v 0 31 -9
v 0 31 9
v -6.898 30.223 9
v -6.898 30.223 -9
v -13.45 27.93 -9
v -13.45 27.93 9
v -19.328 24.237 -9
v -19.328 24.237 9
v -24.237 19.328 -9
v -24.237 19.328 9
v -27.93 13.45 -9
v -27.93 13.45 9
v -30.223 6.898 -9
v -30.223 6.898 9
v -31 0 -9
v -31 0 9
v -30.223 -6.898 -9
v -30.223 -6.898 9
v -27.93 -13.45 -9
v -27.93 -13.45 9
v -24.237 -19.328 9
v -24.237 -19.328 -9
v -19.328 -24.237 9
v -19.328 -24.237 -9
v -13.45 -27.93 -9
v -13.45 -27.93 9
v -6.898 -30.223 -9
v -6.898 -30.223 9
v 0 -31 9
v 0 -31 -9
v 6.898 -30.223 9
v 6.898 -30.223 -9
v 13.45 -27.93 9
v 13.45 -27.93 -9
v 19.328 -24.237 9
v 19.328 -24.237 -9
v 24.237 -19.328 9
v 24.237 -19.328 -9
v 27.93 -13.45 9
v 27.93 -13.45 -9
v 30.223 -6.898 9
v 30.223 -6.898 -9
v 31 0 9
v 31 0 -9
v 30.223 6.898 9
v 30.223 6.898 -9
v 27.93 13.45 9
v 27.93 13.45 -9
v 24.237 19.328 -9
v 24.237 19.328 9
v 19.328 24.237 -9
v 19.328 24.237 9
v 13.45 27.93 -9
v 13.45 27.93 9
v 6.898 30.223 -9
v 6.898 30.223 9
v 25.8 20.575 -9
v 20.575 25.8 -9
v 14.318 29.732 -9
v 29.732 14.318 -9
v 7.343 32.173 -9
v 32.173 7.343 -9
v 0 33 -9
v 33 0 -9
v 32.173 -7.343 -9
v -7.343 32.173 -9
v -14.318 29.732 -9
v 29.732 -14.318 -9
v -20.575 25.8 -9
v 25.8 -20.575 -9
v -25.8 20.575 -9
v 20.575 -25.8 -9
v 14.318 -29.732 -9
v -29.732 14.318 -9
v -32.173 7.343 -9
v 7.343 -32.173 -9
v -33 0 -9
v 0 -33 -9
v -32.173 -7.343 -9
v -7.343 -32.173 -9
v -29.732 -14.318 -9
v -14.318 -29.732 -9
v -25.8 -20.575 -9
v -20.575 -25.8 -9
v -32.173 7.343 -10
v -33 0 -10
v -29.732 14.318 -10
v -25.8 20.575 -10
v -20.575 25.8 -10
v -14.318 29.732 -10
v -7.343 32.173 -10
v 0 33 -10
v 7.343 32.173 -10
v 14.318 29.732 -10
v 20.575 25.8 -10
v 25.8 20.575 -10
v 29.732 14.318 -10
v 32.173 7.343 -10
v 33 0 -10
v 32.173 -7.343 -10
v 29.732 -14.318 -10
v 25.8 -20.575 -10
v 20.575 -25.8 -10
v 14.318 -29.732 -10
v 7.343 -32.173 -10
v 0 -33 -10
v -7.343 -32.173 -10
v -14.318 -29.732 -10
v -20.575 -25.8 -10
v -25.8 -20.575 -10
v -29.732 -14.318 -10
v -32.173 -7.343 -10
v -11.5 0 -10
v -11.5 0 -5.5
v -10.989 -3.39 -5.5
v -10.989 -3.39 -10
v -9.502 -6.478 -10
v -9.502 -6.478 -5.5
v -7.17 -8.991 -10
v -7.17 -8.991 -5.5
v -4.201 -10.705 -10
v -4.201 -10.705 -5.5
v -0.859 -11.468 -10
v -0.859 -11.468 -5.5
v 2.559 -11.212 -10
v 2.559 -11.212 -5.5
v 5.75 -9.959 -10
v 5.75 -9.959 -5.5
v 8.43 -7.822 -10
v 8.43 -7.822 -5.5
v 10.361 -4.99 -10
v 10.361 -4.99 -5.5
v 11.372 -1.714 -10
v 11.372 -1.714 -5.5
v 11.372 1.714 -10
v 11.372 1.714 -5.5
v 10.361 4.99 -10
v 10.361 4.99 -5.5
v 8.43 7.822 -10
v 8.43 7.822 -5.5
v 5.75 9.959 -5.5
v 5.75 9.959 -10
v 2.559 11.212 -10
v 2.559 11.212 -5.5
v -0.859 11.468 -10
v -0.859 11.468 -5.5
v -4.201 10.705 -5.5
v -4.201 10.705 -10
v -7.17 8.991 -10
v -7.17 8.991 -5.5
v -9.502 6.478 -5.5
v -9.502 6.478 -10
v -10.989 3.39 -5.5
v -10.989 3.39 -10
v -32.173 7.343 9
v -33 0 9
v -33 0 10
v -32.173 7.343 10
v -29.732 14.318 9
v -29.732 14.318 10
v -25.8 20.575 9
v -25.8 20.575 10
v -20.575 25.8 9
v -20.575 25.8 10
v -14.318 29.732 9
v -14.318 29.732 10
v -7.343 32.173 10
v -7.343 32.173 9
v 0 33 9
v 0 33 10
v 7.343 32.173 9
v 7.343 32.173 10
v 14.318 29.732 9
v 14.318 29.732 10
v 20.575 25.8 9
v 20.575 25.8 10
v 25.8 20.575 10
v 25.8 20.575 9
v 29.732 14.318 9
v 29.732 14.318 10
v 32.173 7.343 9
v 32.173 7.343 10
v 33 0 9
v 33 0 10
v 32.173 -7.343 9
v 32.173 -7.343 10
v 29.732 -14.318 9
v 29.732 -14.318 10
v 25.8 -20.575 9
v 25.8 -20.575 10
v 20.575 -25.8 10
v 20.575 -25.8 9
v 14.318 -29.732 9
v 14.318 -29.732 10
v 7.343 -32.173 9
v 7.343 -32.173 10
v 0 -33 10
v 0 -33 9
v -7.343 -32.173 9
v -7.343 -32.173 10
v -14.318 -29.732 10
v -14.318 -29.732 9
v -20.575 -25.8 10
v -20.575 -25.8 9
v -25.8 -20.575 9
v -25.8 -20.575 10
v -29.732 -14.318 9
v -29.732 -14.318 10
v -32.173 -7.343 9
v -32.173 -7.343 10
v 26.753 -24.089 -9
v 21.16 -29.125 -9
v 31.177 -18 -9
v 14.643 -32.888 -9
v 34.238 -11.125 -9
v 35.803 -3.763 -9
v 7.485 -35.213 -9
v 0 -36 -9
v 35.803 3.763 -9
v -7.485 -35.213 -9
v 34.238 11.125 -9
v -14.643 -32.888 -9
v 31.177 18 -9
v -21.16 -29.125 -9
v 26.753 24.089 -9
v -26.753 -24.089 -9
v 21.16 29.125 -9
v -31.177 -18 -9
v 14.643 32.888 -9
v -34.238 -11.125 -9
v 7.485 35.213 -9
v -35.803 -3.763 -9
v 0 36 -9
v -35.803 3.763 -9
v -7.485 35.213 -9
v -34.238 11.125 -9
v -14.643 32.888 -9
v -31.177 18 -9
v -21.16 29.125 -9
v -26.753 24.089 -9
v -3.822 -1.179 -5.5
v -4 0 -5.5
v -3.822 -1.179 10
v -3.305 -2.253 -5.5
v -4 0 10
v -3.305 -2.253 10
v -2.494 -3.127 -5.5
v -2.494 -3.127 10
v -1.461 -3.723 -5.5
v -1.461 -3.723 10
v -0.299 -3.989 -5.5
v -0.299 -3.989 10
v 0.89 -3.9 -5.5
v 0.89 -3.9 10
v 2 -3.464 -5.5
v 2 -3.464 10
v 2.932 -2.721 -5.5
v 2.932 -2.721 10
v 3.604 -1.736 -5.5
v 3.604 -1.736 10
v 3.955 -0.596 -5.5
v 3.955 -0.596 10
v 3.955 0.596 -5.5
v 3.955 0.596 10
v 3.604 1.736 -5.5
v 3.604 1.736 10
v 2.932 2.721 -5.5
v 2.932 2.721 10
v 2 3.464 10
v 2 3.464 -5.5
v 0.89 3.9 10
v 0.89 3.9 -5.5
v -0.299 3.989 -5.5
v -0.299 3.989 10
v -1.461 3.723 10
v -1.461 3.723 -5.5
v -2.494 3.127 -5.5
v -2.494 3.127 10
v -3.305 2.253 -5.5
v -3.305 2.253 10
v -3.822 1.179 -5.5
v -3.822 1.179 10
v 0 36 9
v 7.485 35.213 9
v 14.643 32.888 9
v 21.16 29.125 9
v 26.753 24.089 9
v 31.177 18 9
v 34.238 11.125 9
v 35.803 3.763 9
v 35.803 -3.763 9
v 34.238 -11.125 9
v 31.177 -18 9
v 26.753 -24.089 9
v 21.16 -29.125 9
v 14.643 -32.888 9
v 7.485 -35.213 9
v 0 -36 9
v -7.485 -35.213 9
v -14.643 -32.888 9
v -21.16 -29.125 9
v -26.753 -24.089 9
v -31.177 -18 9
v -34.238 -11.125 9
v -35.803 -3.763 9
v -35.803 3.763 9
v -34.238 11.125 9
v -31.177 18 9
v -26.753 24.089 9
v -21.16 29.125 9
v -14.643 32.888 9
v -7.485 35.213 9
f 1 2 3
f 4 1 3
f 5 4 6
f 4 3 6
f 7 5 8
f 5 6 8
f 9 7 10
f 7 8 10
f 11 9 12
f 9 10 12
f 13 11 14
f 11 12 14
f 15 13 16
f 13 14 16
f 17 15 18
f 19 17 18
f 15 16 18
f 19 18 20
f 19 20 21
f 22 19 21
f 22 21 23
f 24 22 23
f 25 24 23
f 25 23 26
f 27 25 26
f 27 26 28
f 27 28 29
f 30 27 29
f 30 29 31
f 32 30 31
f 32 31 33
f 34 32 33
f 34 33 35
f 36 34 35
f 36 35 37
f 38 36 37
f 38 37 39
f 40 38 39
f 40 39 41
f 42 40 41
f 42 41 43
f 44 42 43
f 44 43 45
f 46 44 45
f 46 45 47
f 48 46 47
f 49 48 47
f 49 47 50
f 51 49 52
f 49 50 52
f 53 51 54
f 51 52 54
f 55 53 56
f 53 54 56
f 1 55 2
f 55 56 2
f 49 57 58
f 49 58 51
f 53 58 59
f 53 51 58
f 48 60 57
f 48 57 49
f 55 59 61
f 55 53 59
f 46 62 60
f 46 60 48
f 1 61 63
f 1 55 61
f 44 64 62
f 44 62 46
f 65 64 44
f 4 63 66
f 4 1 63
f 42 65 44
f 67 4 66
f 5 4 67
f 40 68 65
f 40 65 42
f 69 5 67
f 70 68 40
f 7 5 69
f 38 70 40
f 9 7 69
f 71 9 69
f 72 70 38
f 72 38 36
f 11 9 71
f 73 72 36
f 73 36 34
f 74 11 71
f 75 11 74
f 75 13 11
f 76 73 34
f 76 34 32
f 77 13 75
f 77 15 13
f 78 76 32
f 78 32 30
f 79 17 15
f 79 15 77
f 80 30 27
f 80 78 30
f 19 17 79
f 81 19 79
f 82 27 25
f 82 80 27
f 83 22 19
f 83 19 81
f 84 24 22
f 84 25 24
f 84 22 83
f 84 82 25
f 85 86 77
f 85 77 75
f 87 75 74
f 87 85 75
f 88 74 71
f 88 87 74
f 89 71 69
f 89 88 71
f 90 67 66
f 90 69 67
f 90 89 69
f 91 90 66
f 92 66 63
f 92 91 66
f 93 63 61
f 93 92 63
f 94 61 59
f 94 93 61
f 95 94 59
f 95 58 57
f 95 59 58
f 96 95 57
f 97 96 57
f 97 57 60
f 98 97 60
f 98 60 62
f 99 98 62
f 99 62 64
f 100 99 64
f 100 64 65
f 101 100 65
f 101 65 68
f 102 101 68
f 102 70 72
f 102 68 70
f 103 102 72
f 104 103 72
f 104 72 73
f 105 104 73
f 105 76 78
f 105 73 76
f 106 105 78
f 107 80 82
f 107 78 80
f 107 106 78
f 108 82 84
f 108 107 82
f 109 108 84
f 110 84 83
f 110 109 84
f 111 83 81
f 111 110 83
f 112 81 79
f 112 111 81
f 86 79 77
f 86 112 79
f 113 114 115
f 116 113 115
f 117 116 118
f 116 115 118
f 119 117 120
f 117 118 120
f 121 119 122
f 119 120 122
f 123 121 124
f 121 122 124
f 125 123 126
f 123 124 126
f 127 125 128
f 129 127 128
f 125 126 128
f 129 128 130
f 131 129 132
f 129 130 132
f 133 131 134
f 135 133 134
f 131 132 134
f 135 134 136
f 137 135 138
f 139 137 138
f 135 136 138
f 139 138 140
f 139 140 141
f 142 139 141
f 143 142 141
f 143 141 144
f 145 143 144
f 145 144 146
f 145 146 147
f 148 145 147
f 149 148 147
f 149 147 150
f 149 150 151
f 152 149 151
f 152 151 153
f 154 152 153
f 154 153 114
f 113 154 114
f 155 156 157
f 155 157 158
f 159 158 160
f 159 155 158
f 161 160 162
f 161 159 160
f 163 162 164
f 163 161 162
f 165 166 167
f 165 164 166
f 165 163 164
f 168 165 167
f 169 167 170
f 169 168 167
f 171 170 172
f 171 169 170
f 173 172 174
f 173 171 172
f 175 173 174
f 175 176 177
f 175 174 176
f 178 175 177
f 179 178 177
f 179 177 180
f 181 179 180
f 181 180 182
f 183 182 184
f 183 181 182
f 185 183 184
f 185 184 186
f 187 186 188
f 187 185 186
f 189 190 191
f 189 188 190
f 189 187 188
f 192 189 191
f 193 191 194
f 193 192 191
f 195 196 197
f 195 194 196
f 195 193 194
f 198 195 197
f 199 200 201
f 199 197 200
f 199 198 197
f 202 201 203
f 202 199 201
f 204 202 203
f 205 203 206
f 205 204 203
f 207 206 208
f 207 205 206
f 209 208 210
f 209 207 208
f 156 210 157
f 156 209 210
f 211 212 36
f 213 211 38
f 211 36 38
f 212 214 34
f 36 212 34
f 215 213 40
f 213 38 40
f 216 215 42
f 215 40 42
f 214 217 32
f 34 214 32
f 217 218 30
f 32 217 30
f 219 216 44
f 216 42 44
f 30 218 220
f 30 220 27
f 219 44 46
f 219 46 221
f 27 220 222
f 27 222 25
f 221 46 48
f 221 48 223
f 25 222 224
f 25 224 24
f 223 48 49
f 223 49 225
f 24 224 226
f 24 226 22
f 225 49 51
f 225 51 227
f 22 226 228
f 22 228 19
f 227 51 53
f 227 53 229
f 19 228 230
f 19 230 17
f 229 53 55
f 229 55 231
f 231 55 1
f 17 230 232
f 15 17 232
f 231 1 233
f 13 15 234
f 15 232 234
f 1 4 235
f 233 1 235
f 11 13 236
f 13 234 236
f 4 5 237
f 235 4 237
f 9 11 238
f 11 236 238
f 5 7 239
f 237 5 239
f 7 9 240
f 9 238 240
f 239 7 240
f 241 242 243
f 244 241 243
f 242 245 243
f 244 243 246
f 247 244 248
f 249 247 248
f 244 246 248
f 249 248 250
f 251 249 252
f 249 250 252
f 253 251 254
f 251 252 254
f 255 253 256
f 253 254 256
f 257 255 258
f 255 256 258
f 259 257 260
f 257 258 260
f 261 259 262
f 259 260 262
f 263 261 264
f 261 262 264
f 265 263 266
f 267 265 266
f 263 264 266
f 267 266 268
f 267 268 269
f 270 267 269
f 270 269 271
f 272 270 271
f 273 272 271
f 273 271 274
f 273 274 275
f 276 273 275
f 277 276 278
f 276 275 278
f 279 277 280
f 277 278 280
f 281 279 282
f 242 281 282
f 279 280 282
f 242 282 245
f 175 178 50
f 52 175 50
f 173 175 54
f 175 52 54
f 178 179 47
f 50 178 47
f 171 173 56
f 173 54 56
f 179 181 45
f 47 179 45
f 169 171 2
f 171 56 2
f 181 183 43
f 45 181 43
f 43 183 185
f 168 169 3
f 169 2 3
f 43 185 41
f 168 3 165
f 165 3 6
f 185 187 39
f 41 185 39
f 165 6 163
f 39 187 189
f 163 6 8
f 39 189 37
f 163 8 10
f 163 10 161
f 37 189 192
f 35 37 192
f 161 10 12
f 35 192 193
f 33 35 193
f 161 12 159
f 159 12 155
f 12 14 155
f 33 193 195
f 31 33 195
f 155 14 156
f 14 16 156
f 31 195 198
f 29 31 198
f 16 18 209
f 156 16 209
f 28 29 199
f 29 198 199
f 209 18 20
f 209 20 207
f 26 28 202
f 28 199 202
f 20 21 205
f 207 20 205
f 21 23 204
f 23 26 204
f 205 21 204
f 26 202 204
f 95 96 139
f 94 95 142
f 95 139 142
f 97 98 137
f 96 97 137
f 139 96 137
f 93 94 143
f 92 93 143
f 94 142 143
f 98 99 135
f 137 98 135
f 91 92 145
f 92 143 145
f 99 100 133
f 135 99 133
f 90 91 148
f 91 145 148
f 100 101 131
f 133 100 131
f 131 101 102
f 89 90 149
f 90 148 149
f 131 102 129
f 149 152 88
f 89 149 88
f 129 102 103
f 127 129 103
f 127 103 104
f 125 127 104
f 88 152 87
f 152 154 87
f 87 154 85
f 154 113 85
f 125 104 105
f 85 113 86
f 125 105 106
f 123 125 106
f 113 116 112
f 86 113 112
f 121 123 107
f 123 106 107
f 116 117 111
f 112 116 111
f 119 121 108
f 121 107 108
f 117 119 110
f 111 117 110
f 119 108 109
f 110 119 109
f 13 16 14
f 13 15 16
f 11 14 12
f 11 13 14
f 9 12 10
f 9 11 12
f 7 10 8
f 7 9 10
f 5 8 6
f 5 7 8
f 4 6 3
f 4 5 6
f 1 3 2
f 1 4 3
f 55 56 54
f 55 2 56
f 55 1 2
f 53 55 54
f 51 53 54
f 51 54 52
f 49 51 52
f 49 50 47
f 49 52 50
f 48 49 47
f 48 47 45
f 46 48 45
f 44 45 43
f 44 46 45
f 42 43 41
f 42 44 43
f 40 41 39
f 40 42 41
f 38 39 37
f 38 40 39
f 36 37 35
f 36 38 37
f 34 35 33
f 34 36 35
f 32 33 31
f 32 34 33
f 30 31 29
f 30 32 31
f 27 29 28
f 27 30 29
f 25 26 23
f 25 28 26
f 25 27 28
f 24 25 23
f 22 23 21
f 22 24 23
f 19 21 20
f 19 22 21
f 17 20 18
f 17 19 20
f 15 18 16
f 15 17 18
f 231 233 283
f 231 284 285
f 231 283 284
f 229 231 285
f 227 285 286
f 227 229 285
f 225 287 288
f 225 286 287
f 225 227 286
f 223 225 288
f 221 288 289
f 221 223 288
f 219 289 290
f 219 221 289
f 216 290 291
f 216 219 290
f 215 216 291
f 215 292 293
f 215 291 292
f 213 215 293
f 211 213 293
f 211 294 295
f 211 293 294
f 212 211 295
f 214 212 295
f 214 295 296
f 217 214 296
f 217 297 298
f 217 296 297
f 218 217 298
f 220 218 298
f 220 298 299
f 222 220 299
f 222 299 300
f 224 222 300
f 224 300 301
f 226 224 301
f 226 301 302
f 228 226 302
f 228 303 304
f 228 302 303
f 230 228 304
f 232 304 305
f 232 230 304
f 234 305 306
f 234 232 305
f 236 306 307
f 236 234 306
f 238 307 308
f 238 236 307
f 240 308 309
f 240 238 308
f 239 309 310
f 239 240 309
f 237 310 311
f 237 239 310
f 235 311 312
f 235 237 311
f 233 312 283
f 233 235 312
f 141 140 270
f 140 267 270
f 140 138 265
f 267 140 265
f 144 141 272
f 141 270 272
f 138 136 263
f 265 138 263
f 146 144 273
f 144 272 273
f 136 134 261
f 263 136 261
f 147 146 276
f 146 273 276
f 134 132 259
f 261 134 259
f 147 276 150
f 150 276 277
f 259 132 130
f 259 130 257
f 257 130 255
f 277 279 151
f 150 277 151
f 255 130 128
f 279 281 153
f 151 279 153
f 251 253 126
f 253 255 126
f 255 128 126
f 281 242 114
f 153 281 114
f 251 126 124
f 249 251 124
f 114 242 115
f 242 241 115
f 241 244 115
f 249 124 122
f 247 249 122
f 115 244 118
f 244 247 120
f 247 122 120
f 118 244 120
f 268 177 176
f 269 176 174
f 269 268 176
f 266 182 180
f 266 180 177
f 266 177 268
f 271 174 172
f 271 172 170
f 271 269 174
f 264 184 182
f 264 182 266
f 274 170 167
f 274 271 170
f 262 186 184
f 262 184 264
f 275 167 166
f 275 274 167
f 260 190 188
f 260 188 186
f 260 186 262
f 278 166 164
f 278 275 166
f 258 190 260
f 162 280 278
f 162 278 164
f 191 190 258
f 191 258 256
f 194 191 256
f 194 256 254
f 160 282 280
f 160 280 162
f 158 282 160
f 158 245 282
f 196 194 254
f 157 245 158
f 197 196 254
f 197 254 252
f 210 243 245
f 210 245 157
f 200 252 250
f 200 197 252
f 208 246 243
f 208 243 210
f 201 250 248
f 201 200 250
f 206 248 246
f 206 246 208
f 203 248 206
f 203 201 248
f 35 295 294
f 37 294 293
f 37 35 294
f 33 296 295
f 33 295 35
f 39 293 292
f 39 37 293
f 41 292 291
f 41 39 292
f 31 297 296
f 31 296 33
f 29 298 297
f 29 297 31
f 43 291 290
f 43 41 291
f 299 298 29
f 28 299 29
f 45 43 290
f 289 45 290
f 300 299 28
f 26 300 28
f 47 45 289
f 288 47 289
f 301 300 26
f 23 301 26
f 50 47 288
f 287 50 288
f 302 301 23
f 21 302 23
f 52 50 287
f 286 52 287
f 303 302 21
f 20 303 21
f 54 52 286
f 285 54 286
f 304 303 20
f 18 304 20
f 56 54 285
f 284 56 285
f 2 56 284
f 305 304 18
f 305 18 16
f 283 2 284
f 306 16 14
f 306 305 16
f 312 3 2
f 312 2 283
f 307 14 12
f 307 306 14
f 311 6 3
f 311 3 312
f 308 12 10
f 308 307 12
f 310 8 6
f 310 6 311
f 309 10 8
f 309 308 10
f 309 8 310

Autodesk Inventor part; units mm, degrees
ref_plane "YZ Plane" through (0, 0, 0) normal (1, 0, 0) x (0, 1, 0)
ref_plane "XZ Plane" through (0, 0, 0) normal (0, 1, 0) x (-1, 0, 0)
ref_plane "XY Plane" through (0, 0, 0) normal (0, 0, 1) x (1, 0, 0)
sketch "Skizze1" plane through (0, 0, 0) normal (0, 1, 0) x (-1, 0, 0)
  line L0 (4, 10) -> (33, 10)
  line L1 (33, 10) -> (33, 9)
  line L2 (33, 9) -> (31, 9)
  line L3 (31, 9) -> (31, -9)
  line L4 (31, -9) -> (33, -9)
  line L5 (33, -9) -> (33, -10)
  line L6 (33, -10) -> (11.5, -10)
  line L7 (11.5, -10) -> (11.5, -5.5)
  line L8 (11.5, -5.5) -> (4, -5.5)
  line L9 (4, -5.5) -> (4, 10)
  line L10 (0, -14) -> (0, 14) construction
  line L11 (39.6, 0) -> (-6.6, 0) construction
  point P0 (0, 0)
  point P1 (31, 0)
  dimension "d0" = 4
  dimension "d1" = 2
  dimension "d2" = 33
  dimension "d3" = 18
  dimension "d4" = 20
  dimension "d5" = 4.5
  dimension "d6" = 11.5
revolve "Umdrehung1" add sketch "Skizze1" angle 360 about axis through (0, 0, -10) along (0, 0, 1)
sketch "Skizze2" plane through (0, 0, 0) normal (1, 0, 0) x (0, 1, 0)
  line L0 (-33, -9) -> (33, -9) construction
  line L1 (31, 9) -> (31, -9) construction
  line L2 (-33, 9) -> (33, 9) construction
  line L3 (36, -9) -> (31, -9)
  line L4 (31, -9) -> (31, 9)
  line L5 (31, 9) -> (36, 9)
  line L6 (36, 9) -> (36, -9)
  line L7 (0, -14) -> (0, 14) projected
  point P0 (0, 0)
  dimension "d8" = 5
revolve "Umdrehung2" add sketch "Skizze2" angle 360 about axis through (0, 0, -10) along (0, 0, 1) separate body
properties part number "Rad"
